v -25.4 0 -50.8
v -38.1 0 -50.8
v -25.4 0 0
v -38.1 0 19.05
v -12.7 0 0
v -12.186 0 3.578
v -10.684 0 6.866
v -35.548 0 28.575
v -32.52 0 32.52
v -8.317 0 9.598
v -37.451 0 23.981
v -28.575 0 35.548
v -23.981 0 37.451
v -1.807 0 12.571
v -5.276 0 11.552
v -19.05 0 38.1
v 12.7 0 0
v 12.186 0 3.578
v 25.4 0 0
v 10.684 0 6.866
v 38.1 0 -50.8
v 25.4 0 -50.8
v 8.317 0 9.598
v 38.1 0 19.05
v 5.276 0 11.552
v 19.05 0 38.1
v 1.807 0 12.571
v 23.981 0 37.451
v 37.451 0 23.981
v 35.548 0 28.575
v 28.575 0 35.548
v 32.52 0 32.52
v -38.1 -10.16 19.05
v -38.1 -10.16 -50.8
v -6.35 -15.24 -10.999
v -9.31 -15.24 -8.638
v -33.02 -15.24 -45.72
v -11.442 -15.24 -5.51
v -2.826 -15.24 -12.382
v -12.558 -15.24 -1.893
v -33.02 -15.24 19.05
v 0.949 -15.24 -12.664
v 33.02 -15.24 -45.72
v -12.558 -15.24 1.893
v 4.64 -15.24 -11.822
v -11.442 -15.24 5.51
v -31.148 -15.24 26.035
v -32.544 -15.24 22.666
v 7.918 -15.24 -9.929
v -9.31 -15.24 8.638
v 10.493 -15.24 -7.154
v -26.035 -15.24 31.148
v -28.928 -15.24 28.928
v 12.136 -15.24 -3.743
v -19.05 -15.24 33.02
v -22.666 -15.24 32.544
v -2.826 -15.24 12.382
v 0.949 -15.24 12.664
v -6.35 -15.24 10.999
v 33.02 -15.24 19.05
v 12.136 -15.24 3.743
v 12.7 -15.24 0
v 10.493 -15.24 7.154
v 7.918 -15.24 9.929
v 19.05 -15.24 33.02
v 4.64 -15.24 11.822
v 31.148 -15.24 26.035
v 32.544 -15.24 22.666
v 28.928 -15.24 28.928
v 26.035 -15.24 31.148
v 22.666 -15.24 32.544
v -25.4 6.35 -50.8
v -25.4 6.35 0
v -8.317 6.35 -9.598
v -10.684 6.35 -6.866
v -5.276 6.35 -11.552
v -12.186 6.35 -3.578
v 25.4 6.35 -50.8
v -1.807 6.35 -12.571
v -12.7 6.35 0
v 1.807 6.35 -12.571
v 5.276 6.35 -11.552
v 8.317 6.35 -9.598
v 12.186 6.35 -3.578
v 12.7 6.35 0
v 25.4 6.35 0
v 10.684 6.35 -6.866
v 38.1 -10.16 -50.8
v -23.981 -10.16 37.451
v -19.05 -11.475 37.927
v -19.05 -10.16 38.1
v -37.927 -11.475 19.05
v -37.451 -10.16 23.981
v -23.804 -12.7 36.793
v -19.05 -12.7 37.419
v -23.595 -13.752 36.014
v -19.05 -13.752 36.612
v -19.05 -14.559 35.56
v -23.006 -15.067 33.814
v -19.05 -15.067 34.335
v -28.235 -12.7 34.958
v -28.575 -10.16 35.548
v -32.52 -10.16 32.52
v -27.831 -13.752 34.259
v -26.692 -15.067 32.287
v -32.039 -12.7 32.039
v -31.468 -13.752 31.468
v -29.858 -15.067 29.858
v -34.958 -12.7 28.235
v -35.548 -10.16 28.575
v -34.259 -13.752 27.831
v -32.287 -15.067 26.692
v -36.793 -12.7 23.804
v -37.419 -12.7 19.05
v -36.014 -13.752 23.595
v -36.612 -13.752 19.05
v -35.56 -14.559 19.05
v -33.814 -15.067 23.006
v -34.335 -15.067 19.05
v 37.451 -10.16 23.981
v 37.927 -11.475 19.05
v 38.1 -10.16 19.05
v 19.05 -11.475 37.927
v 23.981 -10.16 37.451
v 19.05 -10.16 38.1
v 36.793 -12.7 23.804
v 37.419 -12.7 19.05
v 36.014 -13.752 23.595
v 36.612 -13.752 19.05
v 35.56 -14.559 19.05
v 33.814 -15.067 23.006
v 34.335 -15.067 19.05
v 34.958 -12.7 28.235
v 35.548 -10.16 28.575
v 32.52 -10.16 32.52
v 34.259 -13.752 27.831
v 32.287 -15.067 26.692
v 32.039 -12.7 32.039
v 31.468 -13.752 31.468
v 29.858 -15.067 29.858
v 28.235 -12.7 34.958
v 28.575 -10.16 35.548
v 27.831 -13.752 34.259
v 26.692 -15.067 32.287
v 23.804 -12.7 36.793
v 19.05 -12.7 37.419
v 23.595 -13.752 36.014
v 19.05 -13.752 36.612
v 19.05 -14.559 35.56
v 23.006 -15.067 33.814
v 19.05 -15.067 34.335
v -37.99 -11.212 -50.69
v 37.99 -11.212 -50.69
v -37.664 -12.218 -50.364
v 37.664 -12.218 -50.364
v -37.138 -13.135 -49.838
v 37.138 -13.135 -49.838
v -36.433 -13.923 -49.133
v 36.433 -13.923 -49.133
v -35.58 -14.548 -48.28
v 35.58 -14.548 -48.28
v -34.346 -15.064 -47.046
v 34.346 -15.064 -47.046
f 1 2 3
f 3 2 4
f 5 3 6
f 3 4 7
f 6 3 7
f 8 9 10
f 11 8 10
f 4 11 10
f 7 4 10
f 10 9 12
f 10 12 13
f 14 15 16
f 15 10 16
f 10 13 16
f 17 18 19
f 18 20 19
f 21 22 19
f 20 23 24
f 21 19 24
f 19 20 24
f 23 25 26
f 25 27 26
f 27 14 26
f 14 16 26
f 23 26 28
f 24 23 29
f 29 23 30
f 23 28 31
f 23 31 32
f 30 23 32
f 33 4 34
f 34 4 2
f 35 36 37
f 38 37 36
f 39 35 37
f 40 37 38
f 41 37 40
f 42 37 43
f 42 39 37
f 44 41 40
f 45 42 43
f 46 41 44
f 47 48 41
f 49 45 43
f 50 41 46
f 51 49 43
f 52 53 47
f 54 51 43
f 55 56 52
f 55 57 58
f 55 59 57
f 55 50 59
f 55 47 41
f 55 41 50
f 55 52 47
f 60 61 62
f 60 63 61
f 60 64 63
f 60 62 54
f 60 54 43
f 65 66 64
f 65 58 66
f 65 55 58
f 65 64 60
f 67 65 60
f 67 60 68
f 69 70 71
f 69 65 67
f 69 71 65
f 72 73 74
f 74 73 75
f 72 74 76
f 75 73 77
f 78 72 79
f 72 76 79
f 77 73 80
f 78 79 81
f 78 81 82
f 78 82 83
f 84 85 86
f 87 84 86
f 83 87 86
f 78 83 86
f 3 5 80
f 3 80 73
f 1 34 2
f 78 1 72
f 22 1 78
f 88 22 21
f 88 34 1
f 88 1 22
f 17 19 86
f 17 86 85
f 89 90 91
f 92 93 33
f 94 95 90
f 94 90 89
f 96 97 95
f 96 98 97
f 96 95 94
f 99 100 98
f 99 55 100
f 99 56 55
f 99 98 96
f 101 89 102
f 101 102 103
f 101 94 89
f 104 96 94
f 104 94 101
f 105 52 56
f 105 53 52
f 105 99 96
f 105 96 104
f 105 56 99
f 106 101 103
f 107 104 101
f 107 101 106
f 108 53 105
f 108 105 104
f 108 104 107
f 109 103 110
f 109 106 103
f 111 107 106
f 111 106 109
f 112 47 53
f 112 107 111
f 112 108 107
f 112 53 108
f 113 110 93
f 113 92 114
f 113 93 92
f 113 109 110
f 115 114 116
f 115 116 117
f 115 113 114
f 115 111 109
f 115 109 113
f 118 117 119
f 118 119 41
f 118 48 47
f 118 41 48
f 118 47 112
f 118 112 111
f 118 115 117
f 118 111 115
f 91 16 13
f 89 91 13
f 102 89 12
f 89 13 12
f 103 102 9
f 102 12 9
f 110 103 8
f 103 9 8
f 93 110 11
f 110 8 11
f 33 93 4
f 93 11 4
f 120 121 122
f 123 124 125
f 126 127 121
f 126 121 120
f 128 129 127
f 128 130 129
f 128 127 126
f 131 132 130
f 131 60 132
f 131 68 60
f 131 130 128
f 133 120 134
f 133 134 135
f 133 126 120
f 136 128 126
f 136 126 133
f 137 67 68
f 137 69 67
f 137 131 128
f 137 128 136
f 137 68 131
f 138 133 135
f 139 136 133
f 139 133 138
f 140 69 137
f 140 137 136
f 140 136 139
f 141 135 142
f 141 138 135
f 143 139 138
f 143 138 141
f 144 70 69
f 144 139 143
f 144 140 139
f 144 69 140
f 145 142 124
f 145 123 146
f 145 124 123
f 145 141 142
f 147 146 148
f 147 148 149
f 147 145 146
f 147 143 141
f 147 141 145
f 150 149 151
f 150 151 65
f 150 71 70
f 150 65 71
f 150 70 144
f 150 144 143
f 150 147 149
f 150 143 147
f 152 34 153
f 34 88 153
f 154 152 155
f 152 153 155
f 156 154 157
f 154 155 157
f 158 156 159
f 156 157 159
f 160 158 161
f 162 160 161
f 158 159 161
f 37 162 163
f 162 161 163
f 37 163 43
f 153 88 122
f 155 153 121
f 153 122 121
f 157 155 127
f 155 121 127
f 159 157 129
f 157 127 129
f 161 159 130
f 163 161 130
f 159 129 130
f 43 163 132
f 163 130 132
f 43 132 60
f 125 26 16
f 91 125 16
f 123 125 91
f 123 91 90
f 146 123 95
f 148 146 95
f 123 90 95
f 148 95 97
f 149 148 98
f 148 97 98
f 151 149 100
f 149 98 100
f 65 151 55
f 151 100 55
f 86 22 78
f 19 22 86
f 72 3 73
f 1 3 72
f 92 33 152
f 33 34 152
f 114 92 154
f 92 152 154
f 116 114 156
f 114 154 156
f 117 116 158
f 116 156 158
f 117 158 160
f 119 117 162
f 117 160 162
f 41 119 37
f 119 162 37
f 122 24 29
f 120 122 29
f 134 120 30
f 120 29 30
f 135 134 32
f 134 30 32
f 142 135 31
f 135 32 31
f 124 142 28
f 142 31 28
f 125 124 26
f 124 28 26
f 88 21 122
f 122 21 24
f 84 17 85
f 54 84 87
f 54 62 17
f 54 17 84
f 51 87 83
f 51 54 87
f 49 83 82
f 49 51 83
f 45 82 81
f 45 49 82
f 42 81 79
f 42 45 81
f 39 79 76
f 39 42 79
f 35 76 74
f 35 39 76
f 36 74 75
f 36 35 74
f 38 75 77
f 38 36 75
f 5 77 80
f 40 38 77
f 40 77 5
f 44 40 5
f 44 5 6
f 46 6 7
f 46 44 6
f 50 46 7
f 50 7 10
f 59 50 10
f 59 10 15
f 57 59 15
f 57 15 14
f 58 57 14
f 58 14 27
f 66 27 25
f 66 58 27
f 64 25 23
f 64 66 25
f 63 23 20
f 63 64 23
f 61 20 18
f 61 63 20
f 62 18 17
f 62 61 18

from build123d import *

# Parameters (mm, degrees)
F0_R     = 12.7
F1_DEPTH = 15.24
F3_DEPTH = 6.35
F4_R     = 5.08


with BuildPart() as f1:
    # F0 (on Front) → F1 (new body)
    with BuildSketch(Plane.XZ):
        with BuildLine():
            Line((19.05, 38.1), (-19.05, 38.1))
            ThreePointArc((-19.05, 38.1), (-32.520384, 32.520384), (-38.1, 19.05))
            Line((-38.1, 19.05), (-38.1, -50.8))
            Line((-38.1, -50.8), (38.1, -50.8))
            Line((38.1, -50.8), (38.1, 19.05))
            ThreePointArc((38.1, 19.05), (32.520384, 32.520384), (19.05, 38.1))
        make_face()
        Circle(F0_R, mode=Mode.SUBTRACT)
    extrude(amount=F1_DEPTH)

    # F2 (on Front) → F3 (join)
    with BuildSketch(Plane.XZ):
        with BuildLine():
            Line((25.4, -50.8), (25.4, 0))
            Line((25.4, 0), (12.7, 0))
            ThreePointArc((12.7, 0), (0, -12.7), (-12.7, 0))
            Line((-12.7, 0), (-25.4, 0))
            Line((-25.4, 0), (-25.4, -50.8))
            Line((-25.4, -50.8), (25.4, -50.8))
        make_face()
    extrude(amount=-F3_DEPTH)

    # F4
    f4_edges = [f1.edges().sort_by_distance(p)[0] for p in [
        (-38.1, -15.24, -15.875),
        (-32.520384, -15.24, 32.520384),
        (0, -15.24, 38.1),
        (32.520384, -15.24, 32.520384),
        (38.1, -15.24, -15.875),
        (0, -15.24, -50.8),
    ]]
    fillet(f4_edges, radius=F4_R)


solid = f1.part
